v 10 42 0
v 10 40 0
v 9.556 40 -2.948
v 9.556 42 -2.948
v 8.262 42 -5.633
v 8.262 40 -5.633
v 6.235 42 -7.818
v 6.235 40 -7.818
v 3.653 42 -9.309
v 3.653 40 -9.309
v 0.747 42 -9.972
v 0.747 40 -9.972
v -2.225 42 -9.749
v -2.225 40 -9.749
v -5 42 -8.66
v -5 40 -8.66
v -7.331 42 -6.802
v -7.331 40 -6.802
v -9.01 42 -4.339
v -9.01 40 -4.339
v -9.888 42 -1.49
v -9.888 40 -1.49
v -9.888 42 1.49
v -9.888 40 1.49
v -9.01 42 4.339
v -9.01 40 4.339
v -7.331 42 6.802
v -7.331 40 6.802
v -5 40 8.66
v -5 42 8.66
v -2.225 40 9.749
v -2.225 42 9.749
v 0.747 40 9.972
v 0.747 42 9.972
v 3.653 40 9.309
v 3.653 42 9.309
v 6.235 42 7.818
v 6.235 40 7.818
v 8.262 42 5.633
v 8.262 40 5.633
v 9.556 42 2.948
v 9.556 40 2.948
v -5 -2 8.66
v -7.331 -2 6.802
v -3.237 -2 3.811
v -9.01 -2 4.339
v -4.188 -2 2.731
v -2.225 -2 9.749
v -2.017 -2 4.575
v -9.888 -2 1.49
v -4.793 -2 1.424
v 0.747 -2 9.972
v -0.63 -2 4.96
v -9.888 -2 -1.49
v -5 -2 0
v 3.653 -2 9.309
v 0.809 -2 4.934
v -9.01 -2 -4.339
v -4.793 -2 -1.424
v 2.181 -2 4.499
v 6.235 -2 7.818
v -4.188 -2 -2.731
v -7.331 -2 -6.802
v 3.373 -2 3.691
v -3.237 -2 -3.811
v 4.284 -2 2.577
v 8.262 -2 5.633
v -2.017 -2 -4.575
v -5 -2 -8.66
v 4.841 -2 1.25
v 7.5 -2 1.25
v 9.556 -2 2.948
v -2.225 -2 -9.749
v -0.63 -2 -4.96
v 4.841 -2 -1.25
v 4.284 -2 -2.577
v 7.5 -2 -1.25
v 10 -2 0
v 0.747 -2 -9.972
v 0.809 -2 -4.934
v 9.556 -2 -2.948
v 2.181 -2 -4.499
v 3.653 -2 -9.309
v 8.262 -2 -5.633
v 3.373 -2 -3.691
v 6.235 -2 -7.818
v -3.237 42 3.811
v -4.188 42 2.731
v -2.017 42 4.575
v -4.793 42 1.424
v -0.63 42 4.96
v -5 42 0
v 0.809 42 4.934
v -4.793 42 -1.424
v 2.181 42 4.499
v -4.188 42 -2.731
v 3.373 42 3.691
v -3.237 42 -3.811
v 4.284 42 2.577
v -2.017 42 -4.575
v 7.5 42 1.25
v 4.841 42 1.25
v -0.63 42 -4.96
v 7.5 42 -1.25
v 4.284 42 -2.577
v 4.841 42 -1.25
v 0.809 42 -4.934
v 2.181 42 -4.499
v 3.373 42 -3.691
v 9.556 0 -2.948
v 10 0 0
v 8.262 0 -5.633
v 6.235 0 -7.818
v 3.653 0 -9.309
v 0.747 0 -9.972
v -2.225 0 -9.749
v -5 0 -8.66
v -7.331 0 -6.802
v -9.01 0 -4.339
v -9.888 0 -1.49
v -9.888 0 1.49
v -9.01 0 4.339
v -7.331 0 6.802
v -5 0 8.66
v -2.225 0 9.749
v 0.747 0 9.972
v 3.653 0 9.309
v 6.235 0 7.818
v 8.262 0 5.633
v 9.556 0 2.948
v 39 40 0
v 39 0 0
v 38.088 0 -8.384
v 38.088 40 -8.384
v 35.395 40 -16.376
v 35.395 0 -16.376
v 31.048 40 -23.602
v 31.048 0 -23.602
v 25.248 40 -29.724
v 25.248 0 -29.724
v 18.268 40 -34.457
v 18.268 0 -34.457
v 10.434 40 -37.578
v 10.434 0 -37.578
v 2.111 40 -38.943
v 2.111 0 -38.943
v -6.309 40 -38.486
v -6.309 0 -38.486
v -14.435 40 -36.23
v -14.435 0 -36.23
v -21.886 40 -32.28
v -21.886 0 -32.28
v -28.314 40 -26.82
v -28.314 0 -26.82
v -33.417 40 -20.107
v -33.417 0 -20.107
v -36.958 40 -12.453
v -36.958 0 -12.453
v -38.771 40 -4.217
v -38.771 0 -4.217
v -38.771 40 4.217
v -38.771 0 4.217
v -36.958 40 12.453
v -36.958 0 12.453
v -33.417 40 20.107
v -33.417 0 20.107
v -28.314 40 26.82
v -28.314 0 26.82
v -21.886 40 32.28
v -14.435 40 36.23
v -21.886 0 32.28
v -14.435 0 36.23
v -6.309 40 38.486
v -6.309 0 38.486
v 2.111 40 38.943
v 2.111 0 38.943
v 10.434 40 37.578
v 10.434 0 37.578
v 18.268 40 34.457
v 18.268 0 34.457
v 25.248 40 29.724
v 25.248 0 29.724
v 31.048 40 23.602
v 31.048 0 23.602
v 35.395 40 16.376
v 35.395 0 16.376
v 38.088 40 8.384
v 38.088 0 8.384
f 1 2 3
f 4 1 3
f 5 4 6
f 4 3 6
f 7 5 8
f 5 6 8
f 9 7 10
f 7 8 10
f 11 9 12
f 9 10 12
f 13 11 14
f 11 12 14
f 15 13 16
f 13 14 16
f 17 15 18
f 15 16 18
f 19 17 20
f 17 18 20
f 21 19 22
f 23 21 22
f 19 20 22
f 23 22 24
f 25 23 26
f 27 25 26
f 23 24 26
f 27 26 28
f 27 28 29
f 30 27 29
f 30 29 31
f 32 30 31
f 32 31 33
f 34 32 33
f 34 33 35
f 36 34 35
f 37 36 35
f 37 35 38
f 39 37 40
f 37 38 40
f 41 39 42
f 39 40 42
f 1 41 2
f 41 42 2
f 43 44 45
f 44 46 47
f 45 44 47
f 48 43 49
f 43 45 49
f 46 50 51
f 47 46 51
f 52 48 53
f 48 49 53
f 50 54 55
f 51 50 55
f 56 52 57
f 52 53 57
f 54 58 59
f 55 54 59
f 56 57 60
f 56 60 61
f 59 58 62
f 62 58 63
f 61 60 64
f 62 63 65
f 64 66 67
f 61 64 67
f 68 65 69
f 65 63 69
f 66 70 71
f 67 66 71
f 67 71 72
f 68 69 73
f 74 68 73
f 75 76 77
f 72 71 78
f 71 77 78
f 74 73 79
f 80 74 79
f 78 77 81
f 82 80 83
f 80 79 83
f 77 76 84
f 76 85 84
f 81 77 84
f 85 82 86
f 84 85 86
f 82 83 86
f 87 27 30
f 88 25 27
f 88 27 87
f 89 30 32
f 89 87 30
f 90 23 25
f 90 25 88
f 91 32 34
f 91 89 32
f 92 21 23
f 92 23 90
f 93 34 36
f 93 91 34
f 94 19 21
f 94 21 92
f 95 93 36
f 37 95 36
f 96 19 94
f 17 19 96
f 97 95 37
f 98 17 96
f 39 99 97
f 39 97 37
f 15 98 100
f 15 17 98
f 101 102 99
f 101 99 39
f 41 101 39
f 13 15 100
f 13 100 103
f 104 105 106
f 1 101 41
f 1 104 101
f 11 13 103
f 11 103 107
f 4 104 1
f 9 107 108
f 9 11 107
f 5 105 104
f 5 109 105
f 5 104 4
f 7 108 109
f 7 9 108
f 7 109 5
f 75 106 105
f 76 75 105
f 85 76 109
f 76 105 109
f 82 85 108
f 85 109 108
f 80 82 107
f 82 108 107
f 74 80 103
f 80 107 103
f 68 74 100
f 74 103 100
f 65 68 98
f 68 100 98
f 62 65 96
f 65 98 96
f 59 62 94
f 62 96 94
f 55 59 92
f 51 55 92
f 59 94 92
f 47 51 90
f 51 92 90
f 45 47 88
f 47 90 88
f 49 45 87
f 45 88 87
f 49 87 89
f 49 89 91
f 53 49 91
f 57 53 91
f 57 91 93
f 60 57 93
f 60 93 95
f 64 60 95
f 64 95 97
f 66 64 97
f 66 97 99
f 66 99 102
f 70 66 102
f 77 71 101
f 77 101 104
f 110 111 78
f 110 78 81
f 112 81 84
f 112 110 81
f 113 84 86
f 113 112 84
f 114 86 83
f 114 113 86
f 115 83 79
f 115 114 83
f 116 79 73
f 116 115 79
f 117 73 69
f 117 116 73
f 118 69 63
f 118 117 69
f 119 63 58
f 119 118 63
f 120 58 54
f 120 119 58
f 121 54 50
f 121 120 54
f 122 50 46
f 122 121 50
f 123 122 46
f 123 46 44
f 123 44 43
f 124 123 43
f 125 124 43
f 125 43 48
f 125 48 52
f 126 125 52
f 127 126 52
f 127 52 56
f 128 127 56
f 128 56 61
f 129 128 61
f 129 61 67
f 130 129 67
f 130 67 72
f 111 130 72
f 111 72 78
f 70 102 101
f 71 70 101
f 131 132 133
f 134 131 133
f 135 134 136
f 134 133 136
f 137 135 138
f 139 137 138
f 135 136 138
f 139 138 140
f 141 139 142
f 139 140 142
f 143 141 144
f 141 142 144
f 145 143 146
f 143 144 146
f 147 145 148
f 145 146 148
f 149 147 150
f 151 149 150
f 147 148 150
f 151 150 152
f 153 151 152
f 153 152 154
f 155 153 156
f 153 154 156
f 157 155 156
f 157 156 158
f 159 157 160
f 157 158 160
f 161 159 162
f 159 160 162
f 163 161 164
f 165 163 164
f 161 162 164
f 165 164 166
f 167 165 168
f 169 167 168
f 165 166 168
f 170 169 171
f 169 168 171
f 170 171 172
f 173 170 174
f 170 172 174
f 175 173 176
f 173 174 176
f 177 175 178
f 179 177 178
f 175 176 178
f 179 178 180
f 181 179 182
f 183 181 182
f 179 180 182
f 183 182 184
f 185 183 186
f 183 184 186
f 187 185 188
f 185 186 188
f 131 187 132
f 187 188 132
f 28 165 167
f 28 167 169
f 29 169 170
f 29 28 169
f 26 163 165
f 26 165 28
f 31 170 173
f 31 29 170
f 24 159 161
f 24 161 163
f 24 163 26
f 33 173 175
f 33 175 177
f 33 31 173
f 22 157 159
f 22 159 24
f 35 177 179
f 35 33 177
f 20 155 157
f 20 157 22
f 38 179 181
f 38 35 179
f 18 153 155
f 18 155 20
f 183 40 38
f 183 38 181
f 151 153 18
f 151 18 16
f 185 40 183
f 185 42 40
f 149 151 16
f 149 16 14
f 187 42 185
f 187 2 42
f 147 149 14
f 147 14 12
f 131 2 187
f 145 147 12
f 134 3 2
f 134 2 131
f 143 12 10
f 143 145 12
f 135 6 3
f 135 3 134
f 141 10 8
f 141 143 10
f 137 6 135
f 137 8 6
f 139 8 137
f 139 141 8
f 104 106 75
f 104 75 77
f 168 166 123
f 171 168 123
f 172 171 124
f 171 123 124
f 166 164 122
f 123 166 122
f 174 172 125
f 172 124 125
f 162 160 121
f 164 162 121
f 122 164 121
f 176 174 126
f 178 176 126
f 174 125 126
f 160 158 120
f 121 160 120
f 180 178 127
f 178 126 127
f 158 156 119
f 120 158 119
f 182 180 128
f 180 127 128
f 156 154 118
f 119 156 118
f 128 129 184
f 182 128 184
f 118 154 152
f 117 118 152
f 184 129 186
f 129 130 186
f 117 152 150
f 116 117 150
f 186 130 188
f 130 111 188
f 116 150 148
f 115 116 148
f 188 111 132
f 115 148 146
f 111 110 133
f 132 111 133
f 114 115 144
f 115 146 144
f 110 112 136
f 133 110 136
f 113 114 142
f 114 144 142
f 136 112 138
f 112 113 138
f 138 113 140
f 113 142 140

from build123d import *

# Parameters (mm, degrees)
SKETCH1_R                = 39
BOSS_EXTRUDE1_DEPTH      = 40
SKETCH2_R                = 10
BOSS_EXTRUDE2_DEPTH      = 2
BOSS_EXTRUDE2_DEPTH_BACK = 42
SKETCH3_R                = 5
CUT_EXTRUDE1_DEPTH       = 1
CUT_EXTRUDE1_DEPTH_BACK  = 45
SKETCH4_W                = 5
SKETCH4_H                = 2.5
CUT_EXTRUDE2_DEPTH       = 45


with BuildPart() as part:
    # Sketch1 → Boss-Extrude1 (new body)
    with BuildSketch(Plane(origin=(0, 0, 0), x_dir=(1, 0, 0), z_dir=(0, 1, 0))):
        Circle(SKETCH1_R)
    extrude(amount=BOSS_EXTRUDE1_DEPTH)

    # Sketch2 → Boss-Extrude2 (add, two sides)
    with BuildSketch(Plane(origin=(0, 40, 0), x_dir=(1, 0, 0), z_dir=(0, 1, 0))) as boss_extrude2_sk:
        Circle(SKETCH2_R)
    extrude(amount=BOSS_EXTRUDE2_DEPTH)
    extrude(boss_extrude2_sk.sketch, amount=-BOSS_EXTRUDE2_DEPTH_BACK)

    # Sketch3 → Cut-Extrude1 (cut, two sides)
    with BuildSketch(Plane(origin=(0, 42, 0), x_dir=(1, 0, 0), z_dir=(0, 1, 0))) as cut_extrude1_sk:
        Circle(SKETCH3_R)
    extrude(amount=CUT_EXTRUDE1_DEPTH, mode=Mode.SUBTRACT)
    extrude(cut_extrude1_sk.sketch, amount=-CUT_EXTRUDE1_DEPTH_BACK, mode=Mode.SUBTRACT)

    # Sketch4 → Cut-Extrude2 (cut, through all)
    with BuildSketch(Plane(origin=(0, 42, 0), x_dir=(1, 0, 0), z_dir=(0, 1, 0))):
        with Locations((5, 0)):
            Rectangle(SKETCH4_W, SKETCH4_H)
    extrude(amount=-CUT_EXTRUDE2_DEPTH, mode=Mode.SUBTRACT)


solid = part.part
